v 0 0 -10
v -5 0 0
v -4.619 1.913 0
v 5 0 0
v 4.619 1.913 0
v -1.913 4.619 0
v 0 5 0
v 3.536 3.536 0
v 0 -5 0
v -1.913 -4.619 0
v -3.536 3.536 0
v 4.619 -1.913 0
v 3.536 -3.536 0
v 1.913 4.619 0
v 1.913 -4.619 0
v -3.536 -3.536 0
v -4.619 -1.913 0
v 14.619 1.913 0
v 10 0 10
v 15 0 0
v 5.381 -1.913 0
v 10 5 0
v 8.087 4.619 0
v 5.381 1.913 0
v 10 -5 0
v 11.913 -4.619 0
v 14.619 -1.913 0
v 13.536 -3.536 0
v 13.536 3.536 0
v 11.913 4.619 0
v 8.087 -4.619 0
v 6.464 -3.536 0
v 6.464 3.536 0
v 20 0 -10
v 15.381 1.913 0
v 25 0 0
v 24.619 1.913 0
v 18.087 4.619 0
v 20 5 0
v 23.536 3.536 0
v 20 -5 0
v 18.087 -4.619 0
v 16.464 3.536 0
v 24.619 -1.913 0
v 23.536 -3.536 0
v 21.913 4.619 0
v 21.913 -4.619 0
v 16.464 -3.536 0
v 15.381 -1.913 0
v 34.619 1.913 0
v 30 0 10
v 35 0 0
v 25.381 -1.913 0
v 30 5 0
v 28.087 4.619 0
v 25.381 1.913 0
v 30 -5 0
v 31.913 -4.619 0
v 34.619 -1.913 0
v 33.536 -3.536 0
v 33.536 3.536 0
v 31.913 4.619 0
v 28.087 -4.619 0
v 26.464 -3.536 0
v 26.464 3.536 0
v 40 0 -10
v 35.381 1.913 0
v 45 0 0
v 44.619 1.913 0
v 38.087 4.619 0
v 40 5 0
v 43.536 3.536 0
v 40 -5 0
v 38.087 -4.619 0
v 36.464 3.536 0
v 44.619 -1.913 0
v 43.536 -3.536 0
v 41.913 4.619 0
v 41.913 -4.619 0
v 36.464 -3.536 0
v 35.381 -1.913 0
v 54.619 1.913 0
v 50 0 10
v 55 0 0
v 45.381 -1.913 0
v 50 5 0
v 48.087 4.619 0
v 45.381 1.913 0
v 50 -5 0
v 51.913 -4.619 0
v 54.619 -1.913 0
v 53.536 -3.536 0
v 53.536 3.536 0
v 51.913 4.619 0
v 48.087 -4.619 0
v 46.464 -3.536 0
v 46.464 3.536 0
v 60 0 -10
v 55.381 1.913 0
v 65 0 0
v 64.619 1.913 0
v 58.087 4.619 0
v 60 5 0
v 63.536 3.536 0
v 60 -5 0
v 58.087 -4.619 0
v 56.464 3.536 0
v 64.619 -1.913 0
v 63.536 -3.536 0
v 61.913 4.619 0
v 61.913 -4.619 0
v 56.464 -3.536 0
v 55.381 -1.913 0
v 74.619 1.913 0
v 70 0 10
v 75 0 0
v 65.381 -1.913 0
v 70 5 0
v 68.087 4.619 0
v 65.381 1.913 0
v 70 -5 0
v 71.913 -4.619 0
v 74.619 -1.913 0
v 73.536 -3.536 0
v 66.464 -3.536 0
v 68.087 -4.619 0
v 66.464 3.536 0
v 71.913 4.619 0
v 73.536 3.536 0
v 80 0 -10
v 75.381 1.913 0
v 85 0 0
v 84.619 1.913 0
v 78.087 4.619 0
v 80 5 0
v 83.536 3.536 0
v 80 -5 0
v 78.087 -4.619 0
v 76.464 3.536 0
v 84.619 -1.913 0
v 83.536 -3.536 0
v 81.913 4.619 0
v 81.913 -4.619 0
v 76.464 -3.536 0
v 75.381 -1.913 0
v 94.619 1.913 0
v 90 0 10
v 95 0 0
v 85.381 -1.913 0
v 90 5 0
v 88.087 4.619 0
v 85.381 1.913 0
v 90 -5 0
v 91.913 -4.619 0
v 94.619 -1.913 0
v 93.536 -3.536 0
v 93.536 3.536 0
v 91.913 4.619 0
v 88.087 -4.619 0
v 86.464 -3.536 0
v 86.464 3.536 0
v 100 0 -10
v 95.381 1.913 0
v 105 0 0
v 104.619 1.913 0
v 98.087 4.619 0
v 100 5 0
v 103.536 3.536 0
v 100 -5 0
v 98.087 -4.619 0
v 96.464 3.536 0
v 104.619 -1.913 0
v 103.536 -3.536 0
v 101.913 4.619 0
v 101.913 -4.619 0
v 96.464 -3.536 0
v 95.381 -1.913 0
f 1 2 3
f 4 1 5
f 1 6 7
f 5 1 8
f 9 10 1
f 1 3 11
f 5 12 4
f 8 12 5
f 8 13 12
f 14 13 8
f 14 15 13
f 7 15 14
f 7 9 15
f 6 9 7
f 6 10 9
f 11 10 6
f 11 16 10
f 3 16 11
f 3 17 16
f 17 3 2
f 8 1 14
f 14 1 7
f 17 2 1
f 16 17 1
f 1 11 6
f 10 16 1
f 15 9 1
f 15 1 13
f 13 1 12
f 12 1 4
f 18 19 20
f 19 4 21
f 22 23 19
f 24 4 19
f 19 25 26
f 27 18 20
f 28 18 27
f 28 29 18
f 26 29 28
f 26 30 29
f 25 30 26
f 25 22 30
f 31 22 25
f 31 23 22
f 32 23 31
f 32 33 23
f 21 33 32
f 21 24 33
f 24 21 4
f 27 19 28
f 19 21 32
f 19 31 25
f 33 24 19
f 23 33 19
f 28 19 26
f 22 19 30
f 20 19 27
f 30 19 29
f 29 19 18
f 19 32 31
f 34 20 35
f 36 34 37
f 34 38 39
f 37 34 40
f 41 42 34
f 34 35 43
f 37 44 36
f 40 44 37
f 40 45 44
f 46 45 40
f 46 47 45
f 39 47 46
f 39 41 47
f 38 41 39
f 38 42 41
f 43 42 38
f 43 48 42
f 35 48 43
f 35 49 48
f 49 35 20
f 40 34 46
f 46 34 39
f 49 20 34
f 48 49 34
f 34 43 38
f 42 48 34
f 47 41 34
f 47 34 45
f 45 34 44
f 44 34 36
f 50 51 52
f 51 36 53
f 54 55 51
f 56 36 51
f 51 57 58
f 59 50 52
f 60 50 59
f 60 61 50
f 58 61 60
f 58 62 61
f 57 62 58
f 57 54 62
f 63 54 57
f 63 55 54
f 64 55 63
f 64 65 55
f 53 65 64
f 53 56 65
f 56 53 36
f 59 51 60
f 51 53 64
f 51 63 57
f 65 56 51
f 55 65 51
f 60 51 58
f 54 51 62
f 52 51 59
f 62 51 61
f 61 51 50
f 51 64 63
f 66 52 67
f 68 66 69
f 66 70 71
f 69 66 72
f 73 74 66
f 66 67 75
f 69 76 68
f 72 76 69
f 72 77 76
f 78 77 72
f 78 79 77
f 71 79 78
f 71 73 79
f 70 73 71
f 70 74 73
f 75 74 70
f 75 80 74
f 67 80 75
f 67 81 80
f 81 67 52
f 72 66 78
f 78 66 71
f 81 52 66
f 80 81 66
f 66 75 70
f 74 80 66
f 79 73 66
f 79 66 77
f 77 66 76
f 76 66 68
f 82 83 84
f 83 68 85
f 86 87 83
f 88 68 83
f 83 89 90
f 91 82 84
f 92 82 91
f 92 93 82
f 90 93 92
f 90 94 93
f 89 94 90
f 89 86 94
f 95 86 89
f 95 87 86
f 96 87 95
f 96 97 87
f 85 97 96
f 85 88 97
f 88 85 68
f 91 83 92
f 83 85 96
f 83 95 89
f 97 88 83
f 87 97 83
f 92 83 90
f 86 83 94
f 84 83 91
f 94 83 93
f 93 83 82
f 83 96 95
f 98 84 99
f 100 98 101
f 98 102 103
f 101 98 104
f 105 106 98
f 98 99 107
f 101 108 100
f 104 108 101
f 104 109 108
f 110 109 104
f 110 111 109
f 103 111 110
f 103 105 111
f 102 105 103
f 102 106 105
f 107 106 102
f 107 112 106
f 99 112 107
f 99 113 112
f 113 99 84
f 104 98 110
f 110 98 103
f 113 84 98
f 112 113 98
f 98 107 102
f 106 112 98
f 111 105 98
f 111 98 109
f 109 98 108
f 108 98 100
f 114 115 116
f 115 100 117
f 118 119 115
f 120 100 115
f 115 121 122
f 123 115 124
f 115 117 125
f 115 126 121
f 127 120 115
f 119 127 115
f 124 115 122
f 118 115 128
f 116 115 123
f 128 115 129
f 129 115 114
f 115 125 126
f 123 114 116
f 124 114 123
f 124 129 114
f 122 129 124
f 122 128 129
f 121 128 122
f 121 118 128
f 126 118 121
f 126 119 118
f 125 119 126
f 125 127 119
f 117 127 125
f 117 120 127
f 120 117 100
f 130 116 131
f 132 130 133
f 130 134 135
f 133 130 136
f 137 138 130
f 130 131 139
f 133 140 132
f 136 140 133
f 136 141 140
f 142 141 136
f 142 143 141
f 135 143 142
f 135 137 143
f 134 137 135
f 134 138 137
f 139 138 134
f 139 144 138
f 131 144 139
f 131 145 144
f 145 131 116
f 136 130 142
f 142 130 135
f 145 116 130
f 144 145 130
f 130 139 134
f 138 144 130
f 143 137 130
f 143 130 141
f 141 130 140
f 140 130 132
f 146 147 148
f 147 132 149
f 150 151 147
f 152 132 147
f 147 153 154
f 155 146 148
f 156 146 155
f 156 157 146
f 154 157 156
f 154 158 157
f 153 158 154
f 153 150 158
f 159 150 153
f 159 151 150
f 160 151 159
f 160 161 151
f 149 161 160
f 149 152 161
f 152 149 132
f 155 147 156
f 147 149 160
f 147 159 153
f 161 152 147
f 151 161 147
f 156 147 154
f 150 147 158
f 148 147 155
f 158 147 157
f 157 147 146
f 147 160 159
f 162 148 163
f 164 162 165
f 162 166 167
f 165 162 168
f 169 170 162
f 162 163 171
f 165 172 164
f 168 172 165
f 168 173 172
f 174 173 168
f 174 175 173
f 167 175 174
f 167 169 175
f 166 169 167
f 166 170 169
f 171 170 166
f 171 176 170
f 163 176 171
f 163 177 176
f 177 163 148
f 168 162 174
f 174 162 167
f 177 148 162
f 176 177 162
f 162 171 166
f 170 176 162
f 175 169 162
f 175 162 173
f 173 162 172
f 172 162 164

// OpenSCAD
for(i=[0:1:10]){
    if(i%2==0)
        translate([i*10,0,0]) rotate([0,-180,0]) cylinder(h=10, r1=5, r2=0);
    else
        translate([i*10,0,0]) cylinder(h=10, r1=5, r2=0);
}
